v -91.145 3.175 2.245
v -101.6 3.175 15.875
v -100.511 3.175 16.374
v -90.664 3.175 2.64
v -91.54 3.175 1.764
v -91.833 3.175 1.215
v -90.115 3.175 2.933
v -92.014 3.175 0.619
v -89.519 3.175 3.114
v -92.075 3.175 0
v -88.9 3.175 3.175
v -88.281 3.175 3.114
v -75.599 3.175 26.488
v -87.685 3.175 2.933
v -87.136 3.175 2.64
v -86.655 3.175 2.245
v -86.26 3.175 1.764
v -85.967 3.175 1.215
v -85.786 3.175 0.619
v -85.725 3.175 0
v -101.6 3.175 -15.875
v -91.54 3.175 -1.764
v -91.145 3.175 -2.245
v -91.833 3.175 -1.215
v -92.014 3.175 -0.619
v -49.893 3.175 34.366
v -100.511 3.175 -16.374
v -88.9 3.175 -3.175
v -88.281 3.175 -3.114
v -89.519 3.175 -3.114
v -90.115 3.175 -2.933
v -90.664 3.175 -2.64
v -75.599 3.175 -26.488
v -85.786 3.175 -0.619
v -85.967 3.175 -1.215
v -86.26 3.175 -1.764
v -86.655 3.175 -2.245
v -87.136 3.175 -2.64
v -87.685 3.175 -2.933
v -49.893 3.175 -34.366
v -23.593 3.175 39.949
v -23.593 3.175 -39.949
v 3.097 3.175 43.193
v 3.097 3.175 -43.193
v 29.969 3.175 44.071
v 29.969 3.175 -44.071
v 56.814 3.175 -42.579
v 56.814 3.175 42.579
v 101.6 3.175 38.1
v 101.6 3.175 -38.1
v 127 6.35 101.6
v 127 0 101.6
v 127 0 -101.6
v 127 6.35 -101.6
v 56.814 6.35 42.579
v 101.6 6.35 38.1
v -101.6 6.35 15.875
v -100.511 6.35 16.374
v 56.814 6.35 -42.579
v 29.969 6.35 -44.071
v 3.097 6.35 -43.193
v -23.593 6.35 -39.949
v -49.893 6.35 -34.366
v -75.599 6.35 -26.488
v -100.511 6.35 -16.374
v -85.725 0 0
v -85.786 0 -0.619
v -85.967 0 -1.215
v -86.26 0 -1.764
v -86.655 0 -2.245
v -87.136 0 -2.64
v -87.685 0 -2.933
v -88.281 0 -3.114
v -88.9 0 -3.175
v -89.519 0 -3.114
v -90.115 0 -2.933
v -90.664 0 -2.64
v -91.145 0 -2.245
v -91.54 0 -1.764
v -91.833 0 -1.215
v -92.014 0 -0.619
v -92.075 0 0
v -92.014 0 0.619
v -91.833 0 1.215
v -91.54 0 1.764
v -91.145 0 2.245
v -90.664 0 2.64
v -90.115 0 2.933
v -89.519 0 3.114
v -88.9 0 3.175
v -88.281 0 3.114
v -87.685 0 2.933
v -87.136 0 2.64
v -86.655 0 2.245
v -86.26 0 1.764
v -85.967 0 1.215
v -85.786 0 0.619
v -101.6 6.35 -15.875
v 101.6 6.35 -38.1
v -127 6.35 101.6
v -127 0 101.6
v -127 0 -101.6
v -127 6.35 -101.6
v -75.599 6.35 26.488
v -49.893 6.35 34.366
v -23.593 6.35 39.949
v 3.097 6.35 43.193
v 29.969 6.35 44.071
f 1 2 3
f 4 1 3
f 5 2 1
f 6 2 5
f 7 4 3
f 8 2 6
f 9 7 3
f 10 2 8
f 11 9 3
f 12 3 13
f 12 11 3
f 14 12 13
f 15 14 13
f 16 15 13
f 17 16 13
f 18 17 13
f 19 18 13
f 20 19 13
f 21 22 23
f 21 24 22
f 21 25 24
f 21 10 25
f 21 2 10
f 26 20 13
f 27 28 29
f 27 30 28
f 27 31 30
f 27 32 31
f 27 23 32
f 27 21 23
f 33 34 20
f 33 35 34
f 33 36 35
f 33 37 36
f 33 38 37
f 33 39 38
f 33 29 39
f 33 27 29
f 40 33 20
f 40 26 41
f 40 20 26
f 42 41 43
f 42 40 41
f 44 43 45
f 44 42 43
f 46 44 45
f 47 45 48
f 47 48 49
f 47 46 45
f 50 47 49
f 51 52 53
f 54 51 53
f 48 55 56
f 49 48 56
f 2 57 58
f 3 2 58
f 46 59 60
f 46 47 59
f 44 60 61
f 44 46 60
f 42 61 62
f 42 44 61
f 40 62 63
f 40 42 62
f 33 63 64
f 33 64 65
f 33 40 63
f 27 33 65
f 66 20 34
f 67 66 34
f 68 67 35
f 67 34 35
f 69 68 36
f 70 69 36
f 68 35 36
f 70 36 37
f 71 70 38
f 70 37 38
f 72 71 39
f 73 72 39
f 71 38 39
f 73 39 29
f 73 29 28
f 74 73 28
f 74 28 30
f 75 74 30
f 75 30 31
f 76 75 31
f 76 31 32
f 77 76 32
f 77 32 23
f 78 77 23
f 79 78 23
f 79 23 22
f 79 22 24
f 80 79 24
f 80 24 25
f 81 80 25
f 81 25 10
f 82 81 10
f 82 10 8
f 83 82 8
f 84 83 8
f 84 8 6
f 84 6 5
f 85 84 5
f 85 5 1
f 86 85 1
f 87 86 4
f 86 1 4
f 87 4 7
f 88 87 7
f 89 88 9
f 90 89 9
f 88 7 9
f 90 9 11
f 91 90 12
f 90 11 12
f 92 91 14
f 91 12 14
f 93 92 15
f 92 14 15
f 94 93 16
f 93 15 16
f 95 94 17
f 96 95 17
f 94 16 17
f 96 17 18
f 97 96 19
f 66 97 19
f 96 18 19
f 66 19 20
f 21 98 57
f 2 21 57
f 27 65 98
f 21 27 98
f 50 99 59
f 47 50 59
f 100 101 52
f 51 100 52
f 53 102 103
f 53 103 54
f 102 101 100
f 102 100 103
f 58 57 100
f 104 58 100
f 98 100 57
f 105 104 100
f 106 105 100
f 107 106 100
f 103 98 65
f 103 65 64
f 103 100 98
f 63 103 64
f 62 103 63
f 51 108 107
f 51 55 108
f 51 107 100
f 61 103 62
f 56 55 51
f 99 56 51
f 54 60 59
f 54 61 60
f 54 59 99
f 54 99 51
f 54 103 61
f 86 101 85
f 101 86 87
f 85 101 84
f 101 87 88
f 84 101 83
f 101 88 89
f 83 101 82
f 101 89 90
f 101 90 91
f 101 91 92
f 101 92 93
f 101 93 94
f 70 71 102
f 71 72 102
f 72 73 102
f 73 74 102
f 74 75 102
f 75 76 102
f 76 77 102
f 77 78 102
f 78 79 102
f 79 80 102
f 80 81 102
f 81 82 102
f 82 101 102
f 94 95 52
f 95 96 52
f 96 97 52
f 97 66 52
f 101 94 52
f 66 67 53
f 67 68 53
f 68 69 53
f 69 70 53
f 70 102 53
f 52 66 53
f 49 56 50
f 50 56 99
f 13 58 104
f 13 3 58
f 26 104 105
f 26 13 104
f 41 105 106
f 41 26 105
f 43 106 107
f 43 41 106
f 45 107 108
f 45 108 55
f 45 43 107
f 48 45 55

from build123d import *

# Parameters (mm, degrees)
SKETCH1_W           = 254
SKETCH1_H           = 203.2
BOSS_EXTRUDE1_DEPTH = 6.35
SKETCH2_R           = 3.175
CUT_EXTRUDE1_DEPTH  = 6.35
CUT_EXTRUDE3_DEPTH  = 3.175
FILLET2_R           = 304.8


with BuildPart() as part:
    # Sketch1 → Boss-Extrude1 (new body)
    with BuildSketch(Plane(origin=(0, 0, 0), x_dir=(1, 0, 0), z_dir=(0, 1, 0))):
        Rectangle(SKETCH1_W, SKETCH1_H)
    extrude(amount=BOSS_EXTRUDE1_DEPTH)

    # Sketch2 → Cut-Extrude1 (cut)
    with BuildSketch(Plane(origin=(0, 6.35, 0), x_dir=(1, 0, 0), z_dir=(0, 1, 0))):
        with Locations((-88.9, 0)):
            Circle(SKETCH2_R)
    extrude(amount=-CUT_EXTRUDE1_DEPTH, mode=Mode.SUBTRACT)

    # Sketch5 → Cut-Extrude3 (cut)
    with BuildSketch(Plane(origin=(0, 6.35, 0), x_dir=(1, 0, 0), z_dir=(0, 1, 0))):
        Polygon((-101.6, 15.875), (-101.6, -15.875), (-25.4, -50.8), (101.6, -38.1), (101.6, 38.1), (-25.4, 50.8), align=None)
    extrude(amount=-CUT_EXTRUDE3_DEPTH, mode=Mode.SUBTRACT)

    # Fillet2
    fillet2_edges = [part.edges().sort_by_distance(p)[0] for p in [
        (-25.4, 4.7625, -50.8),
        (-25.4, 4.7625, 50.8),
    ]]
    fillet(fillet2_edges, radius=FILLET2_R)


solid = part.part
